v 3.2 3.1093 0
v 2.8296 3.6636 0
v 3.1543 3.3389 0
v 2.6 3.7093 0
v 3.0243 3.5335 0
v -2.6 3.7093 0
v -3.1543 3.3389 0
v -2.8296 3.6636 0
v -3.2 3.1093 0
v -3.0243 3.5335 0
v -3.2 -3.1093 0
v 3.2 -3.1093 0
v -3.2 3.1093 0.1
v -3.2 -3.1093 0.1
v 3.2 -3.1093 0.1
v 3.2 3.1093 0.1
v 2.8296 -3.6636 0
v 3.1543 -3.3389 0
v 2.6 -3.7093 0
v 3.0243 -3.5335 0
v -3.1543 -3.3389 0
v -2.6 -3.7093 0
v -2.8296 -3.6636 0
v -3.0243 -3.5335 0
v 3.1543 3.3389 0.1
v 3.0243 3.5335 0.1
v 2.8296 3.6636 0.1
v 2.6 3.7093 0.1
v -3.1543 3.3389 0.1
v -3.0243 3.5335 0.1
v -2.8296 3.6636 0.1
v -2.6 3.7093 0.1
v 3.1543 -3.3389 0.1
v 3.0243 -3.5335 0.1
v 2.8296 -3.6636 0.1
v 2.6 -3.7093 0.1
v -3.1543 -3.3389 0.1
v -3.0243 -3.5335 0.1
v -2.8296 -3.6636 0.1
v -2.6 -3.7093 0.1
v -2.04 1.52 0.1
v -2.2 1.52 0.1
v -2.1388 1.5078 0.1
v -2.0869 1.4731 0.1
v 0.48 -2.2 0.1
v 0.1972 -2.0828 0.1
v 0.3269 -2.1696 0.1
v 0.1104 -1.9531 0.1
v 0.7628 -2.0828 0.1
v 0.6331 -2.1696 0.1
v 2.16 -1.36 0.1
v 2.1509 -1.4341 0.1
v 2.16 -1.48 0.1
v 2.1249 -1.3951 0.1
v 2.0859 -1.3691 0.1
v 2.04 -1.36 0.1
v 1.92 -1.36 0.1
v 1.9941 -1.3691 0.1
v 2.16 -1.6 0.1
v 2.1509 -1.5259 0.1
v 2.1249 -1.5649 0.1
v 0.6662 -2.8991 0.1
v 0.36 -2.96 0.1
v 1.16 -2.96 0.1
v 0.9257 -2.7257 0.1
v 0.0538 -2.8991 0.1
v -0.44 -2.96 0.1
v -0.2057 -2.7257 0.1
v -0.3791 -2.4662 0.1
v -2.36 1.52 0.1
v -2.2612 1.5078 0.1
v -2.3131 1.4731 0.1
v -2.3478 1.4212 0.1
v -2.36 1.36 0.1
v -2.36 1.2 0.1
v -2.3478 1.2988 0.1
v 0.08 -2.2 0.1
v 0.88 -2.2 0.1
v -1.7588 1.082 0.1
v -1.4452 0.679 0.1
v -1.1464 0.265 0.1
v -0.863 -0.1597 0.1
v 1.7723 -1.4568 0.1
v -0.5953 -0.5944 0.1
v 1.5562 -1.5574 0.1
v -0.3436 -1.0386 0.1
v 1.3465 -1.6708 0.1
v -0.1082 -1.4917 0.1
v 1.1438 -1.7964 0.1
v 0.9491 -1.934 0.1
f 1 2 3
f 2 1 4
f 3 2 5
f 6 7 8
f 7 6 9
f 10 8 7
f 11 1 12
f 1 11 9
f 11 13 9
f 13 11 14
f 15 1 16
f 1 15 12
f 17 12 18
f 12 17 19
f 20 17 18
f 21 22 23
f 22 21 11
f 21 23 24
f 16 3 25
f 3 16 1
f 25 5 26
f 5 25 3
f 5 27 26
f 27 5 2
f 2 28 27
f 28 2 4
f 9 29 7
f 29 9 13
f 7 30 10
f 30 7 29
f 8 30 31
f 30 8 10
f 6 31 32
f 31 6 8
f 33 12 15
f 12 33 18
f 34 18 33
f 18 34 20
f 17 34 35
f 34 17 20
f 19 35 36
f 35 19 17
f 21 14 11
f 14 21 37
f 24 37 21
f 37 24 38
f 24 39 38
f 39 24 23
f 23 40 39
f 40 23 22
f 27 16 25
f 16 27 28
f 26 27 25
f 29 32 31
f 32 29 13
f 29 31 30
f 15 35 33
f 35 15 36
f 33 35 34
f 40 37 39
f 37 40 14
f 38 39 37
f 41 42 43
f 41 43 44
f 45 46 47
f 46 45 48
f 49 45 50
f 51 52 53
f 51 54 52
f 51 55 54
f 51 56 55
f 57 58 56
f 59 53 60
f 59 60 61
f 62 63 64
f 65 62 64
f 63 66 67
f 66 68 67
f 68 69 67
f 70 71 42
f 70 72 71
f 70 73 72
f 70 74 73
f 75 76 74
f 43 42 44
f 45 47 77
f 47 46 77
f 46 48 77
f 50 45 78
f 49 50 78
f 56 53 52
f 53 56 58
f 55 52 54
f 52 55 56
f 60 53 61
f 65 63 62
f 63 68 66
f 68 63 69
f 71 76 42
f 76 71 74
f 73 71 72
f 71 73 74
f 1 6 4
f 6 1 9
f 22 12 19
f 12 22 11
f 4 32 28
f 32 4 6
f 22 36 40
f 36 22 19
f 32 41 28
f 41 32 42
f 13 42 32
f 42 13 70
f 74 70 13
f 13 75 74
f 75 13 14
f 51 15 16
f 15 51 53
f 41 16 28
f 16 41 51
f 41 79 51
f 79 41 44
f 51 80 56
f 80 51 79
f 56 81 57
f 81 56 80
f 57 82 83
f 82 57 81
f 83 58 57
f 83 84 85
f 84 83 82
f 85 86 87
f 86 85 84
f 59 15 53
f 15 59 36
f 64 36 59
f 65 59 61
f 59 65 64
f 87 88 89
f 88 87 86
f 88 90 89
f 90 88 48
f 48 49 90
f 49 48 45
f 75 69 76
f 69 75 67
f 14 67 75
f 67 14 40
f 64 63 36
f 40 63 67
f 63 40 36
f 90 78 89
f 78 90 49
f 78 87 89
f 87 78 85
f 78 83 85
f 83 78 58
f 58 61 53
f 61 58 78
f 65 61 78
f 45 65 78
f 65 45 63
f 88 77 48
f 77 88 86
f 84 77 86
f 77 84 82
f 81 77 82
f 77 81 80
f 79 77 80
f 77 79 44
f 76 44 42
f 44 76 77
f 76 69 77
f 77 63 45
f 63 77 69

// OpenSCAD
// file: ../p/box3u12.scad
use <../lib.scad>
function ldraw_lib__box3u12() = [
// 0 Box with 3 Parallel Faces without Any Edges
// 0 Name: box3u12.dat
// 0 Author: J.C. Tchang [tchang]
// 0 !LDRAW_ORG Primitive UPDATE 2014-02
// 0 !LICENSE Licensed under CC BY 4.0 : see CAreadme.txt
// 
// 0 BFC CERTIFY CCW
  [0,"BFC","CERTIFY"],
  [0,"BFC","CCW"],
// 
// 0 !HISTORY 2014-12-23 [PTadmin] Official Update 2014-02
// 
// 
// 4 16 -1 1 1 1 1 1 1 1 -1 -1 1 -1
  [4,16,-1,1,1,1,1,1,1,1,-1,-1,1,-1],
// 4 16 -1 1 1 -1 0 1 1 0 1 1 1 1
  [4,16,-1,1,1,-1,0,1,1,0,1,1,1,1],
// 4 16 1 1 -1 1 0 -1 -1 0 -1 -1 1 -1
  [4,16,1,1,-1,1,0,-1,-1,0,-1,-1,1,-1],
];
module ldraw_lib__box3u12(step=0, col=false, unit=2/5, alt=false, line=0.2, solid=!$preview)
    makepoly(ldraw_lib__box3u12(), step=step, col=col, unit=unit, alt=alt, line=line, solid=solid);
ldraw_lib__box3u12(line=0.2);
// file: ../p/5-16ndis.scad
use <../lib.scad>
function ldraw_lib__5_16ndis() = [
// 0 Disc Negative 0.3125
// 0 Name: 5-16ndis.dat
// 0 Author: Max Martin Richter [MMR1988]
// 0 !LDRAW_ORG Primitive UPDATE 2013-01
// 0 !LICENSE Licensed under CC BY 4.0 : see CAreadme.txt
// 
// 0 BFC CERTIFY CCW
  [0,"BFC","CERTIFY"],
  [0,"BFC","CCW"],
// 
// 0 !HISTORY 2013-07-21 [PTadmin] Official Update 2013-01
// 
// 
// 3 16 1 0 1 0.9239 0 0.3827 1 0 0
  [3,16,1,0,1,0.9239,0,0.3827,1,0,0],
// 3 16 1 0 1 0.7071 0 0.7071 0.9239 0 0.3827
  [3,16,1,0,1,0.7071,0,0.7071,0.9239,0,0.3827],
// 3 16 1 0 1 0.3827 0 0.9239 0.7071 0 0.7071
  [3,16,1,0,1,0.3827,0,0.9239,0.7071,0,0.7071],
// 3 16 1 0 1 0 0 1 0.3827 0 0.9239
  [3,16,1,0,1,0,0,1,0.3827,0,0.9239],
// 3 16 -1 0 1 -0.3827 0 0.9239 0 0 1
  [3,16,-1,0,1,-0.3827,0,0.9239,0,0,1],
// 0 // Build by Primitive Generator 2
];
module ldraw_lib__5_16ndis(step=0, col=false, unit=2/5, alt=false, line=0.2, solid=!$preview)
    makepoly(ldraw_lib__5_16ndis(), step=step, col=col, unit=unit, alt=alt, line=line, solid=solid);
ldraw_lib__5_16ndis(line=0.2);
// file: ../p/5-16chrd.scad
use <../lib.scad>
function ldraw_lib__5_16chrd() = [
// 0 Chord 0.3125
// 0 Name: 5-16chrd.dat
// 0 Author: Niels Karsdorp [nielsk]
// 0 !LDRAW_ORG Primitive UPDATE 2010-01
// 0 !LICENSE Licensed under CC BY 4.0 : see CAreadme.txt
// 
// 0 BFC CERTIFY CCW
  [0,"BFC","CERTIFY"],
  [0,"BFC","CCW"],
// 
// 0 !HISTORY 2010-04-05 [PTadmin] Official Update 2010-01
// 
// 
// 4 16 1 0 0 0.9239 0 0.3827 0 0 1 -0.3827 0 0.9239
  [4,16,1,0,0,0.9239,0,0.3827,0,0,1,-0.3827,0,0.9239],
// 4 16 0.9239 0 0.3827 0.7071 0 0.7071 0.3827 0 0.9239 0 0 1
  [4,16,0.9239,0,0.3827,0.7071,0,0.7071,0.3827,0,0.9239,0,0,1],
// 0
// 
];
module ldraw_lib__5_16chrd(step=0, col=false, unit=2/5, alt=false, line=0.2, solid=!$preview)
    makepoly(ldraw_lib__5_16chrd(), step=step, col=col, unit=unit, alt=alt, line=line, solid=solid);
ldraw_lib__5_16chrd(line=0.2);
// file: ../p/3-16ndis.scad
use <../lib.scad>
function ldraw_lib__3_16ndis() = [
// 0 Disc Negative 0.1875
// 0 Name: 3-16ndis.dat
// 0 Author: Magnus Forsberg [MagFors]
// 0 !LDRAW_ORG Primitive UPDATE 2024-01
// 0 !LICENSE Licensed under CC BY 4.0 : see CAreadme.txt
// 
// 0 BFC CERTIFY CCW
  [0,"BFC","CERTIFY"],
  [0,"BFC","CCW"],
// 
// 0 !HISTORY 2009-05-02 [PTadmin] Official Update 2009-01
// 0 !HISTORY 2024-01-03 [MagFors] Complete regeneration, original by guyvivan
// 0 !HISTORY 2024-01-29 [OrionP] Official Update 2024-01
// 
// 3 16 1 0 1 0.9239 0 0.3827 1 0 0
  [3,16,1,0,1,0.9239,0,0.3827,1,0,0],
// 3 16 1 0 1 0.7071 0 0.7071 0.9239 0 0.3827
  [3,16,1,0,1,0.7071,0,0.7071,0.9239,0,0.3827],
// 3 16 1 0 1 0.3827 0 0.9239 0.7071 0 0.7071
  [3,16,1,0,1,0.3827,0,0.9239,0.7071,0,0.7071],
// 0 // Build by LDPartEditor (PrimGen 2.X)
];
module ldraw_lib__3_16ndis(step=0, col=false, unit=2/5, alt=false, line=0.2, solid=!$preview)
    makepoly(ldraw_lib__3_16ndis(), step=step, col=col, unit=unit, alt=alt, line=line, solid=solid);
ldraw_lib__3_16ndis(line=0.2);
// file: ../p/3-16chrd.scad
use <../lib.scad>
function ldraw_lib__3_16chrd() = [
// 0 Chord 0.1875
// 0 Name: 3-16chrd.dat
// 0 Author: Niels Karsdorp [nielsk]
// 0 !LDRAW_ORG Primitive UPDATE 2009-01
// 0 !LICENSE Licensed under CC BY 4.0 : see CAreadme.txt
// 
// 0 BFC CERTIFY CCW
  [0,"BFC","CERTIFY"],
  [0,"BFC","CCW"],
// 
// 0 !HISTORY 2009-05-02 [PTadmin] Official Update 2009-01
// 
// 
// 4 16 1 0 0 0.9239 0 0.3827 0.7071 0 0.7071 0.3827 0 0.9239
  [4,16,1,0,0,0.9239,0,0.3827,0.7071,0,0.7071,0.3827,0,0.9239],
// 0
// 
];
module ldraw_lib__3_16chrd(step=0, col=false, unit=2/5, alt=false, line=0.2, solid=!$preview)
    makepoly(ldraw_lib__3_16chrd(), step=step, col=col, unit=unit, alt=alt, line=line, solid=solid);
ldraw_lib__3_16chrd(line=0.2);
// file: ../p/1-8ndis.scad
use <../lib.scad>
function ldraw_lib__1_8ndis() = [
// 0 Disc Negative 0.125
// 0 Name: 1-8ndis.dat
// 0 Author: James Jessiman
// 0 !LDRAW_ORG Primitive UPDATE 2012-01
// 0 !LICENSE Licensed under CC BY 4.0 : see CAreadme.txt
// 
// 0 BFC CERTIFY CCW
  [0,"BFC","CERTIFY"],
  [0,"BFC","CCW"],
// 
// 0 !HISTORY 2002-03-23 [sbliss] Added BFC statement
// 0 !HISTORY 2002-04-25 [PTadmin] Official Update 2002-02
// 0 !HISTORY 2007-06-22 [PTadmin] Header formatted for Contributor Agreement
// 0 !HISTORY 2008-07-01 [PTadmin] Official Update 2008-01
// 0 !HISTORY 2012-02-16 [Philo] Changed to CCW
// 0 !HISTORY 2012-03-30 [PTadmin] Official Update 2012-01
// 
// 
// 3 16 0.9239 0 0.3827 1 0 0 1 0 1
  [3,16,0.9239,0,0.3827,1,0,0,1,0,1],
// 3 16 0.7071 0 0.7071 0.9239 0 0.3827 1 0 1
  [3,16,0.7071,0,0.7071,0.9239,0,0.3827,1,0,1],
];
module ldraw_lib__1_8ndis(step=0, col=false, unit=2/5, alt=false, line=0.2, solid=!$preview)
    makepoly(ldraw_lib__1_8ndis(), step=step, col=col, unit=unit, alt=alt, line=line, solid=solid);
ldraw_lib__1_8ndis(line=0.2);
// file: ../p/1-8chrd.scad
use <../lib.scad>
function ldraw_lib__1_8chrd() = [
// 0 Chord 0.125
// 0 Name: 1-8chrd.dat
// 0 Author: Orion Pobursky [OrionP]
// 0 !LDRAW_ORG Primitive UPDATE 2023-05
// 0 !LICENSE Licensed under CC BY 4.0 : see CAreadme.txt
// 
// 0 BFC CERTIFY CCW
  [0,"BFC","CERTIFY"],
  [0,"BFC","CCW"],
// 
// 0 !HISTORY 2004-04-22 [PTadmin] Official Update 2004-02
// 0 !HISTORY 2007-06-22 [PTadmin] Header formatted for Contributor Agreement
// 0 !HISTORY 2008-07-01 [PTadmin] Official Update 2008-01
// 0 !HISTORY 2023-10-27 [OrionP] Rebuilt with PrimGen2, original author westrate
// 0 !HISTORY 2023-10-31 [OrionP] Official Update 2023-05
// 
// 3 16 1 0 0 0.9239 0 0.3827 0.7071 0 0.7071
  [3,16,1,0,0,0.9239,0,0.3827,0.7071,0,0.7071],
];
module ldraw_lib__1_8chrd(step=0, col=false, unit=2/5, alt=false, line=0.2, solid=!$preview)
    makepoly(ldraw_lib__1_8chrd(), step=step, col=col, unit=unit, alt=alt, line=line, solid=solid);
ldraw_lib__1_8chrd(line=0.2);
// file: ../p/1-4cyli.scad
use <../lib.scad>
function ldraw_lib__1_4cyli() = [
// 0 Cylinder 0.25
// 0 Name: 1-4cyli.dat
// 0 Author: James Jessiman
// 0 !LDRAW_ORG Primitive UPDATE 2012-01
// 0 !LICENSE Licensed under CC BY 4.0 : see CAreadme.txt
// 
// 0 BFC CERTIFY CCW
  [0,"BFC","CERTIFY"],
  [0,"BFC","CCW"],
// 
// 0 !HISTORY 2002-03-23 [sbliss] Added BFC statement.
// 0 !HISTORY 2002-04-25 [PTadmin] Official Update 2002-02
// 0 !HISTORY 2007-06-22 [PTadmin] Header formatted for Contributor Agreement
// 0 !HISTORY 2008-07-01 [PTadmin] Official Update 2008-01
// 0 !HISTORY 2012-02-16 [Philo] Changed to CCW
// 0 !HISTORY 2012-03-30 [PTadmin] Official Update 2012-01
// 
// 
// 4 16 1 1 0 0.9239 1 0.3827 0.9239 0 0.3827 1 0 0
  [4,16,1,1,0,0.9239,1,0.3827,0.9239,0,0.3827,1,0,0],
// 5 24 1 0 0 1 1 0 0.9239 0 0.3827 1 0 -1
  [5,24,1,0,0,1,1,0,0.9239,0,0.3827,1,0,-1],
// 4 16 0.9239 1 0.3827 0.7071 1 0.7071 0.7071 0 0.7071 0.9239 0 0.3827
  [4,16,0.9239,1,0.3827,0.7071,1,0.7071,0.7071,0,0.7071,0.9239,0,0.3827],
// 5 24 0.9239 0 0.3827 0.9239 1 0.3827 0.7071 0 0.7071 1 0 0
  [5,24,0.9239,0,0.3827,0.9239,1,0.3827,0.7071,0,0.7071,1,0,0],
// 4 16 0.7071 1 0.7071 0.3827 1 0.9239 0.3827 0 0.9239 0.7071 0 0.7071
  [4,16,0.7071,1,0.7071,0.3827,1,0.9239,0.3827,0,0.9239,0.7071,0,0.7071],
// 5 24 0.7071 0 0.7071 0.7071 1 0.7071 0.3827 0 0.9239 0.9239 0 0.3827
  [5,24,0.7071,0,0.7071,0.7071,1,0.7071,0.3827,0,0.9239,0.9239,0,0.3827],
// 4 16 0.3827 1 0.9239 0 1 1 0 0 1 0.3827 0 0.9239
  [4,16,0.3827,1,0.9239,0,1,1,0,0,1,0.3827,0,0.9239],
// 5 24 0.3827 0 0.9239 0.3827 1 0.9239 0 0 1 0.7071 0 0.7071
  [5,24,0.3827,0,0.9239,0.3827,1,0.9239,0,0,1,0.7071,0,0.7071],
// 5 24 0 0 1 0 1 1 0.3827 0 0.9239 -1 0 1
  [5,24,0,0,1,0,1,1,0.3827,0,0.9239,-1,0,1],
];
module ldraw_lib__1_4cyli(step=0, col=false, unit=2/5, alt=false, line=0.2, solid=!$preview)
    makepoly(ldraw_lib__1_4cyli(), step=step, col=col, unit=unit, alt=alt, line=line, solid=solid);
ldraw_lib__1_4cyli(line=0.2);
// file: ../p/1-4chrd.scad
use <../lib.scad>
function ldraw_lib__1_4chrd() = [
// 0 Chord 0.25
// 0 Name: 1-4chrd.dat
// 0 Author: Max Martin Richter [MMR1988]
// 0 !LDRAW_ORG Primitive UPDATE 2023-05
// 0 !LICENSE Licensed under CC BY 4.0 : see CAreadme.txt
// 
// 0 BFC CERTIFY CCW
  [0,"BFC","CERTIFY"],
  [0,"BFC","CCW"],
// 
// 0 !HISTORY 2004-04-22 [PTadmin] Official Update 2004-02
// 0 !HISTORY 2007-10-09 [PTadmin] Header formatted for Contributor Agreement
// 0 !HISTORY 2008-07-01 [PTadmin] Official Update 2008-01
// 0 !HISTORY 2012-08-02 [MMR1988] Re-creation with PrimGen2 and Rectifier
// 0 !HISTORY 2012-08-09 [PTadmin] Official Update 2012-02
// 0 !HISTORY 2023-10-27 [OrionP] Change author to MMR1988 from hafhead
// 0 !HISTORY 2023-10-31 [OrionP] Official Update 2023-05
// 
// 4 16 0.9239 0 0.3827 0.3827 0 0.9239 0 0 1 1 0 0
  [4,16,0.9239,0,0.3827,0.3827,0,0.9239,0,0,1,1,0,0],
// 3 16 0.7071 0 0.7071 0.3827 0 0.9239 0.9239 0 0.3827
  [3,16,0.7071,0,0.7071,0.3827,0,0.9239,0.9239,0,0.3827],
];
module ldraw_lib__1_4chrd(step=0, col=false, unit=2/5, alt=false, line=0.2, solid=!$preview)
    makepoly(ldraw_lib__1_4chrd(), step=step, col=col, unit=unit, alt=alt, line=line, solid=solid);
ldraw_lib__1_4chrd(line=0.2);
// main file
use <../lib.scad>
use <6177741w.scad>
function ldraw_lib__6177741x() = [
// 0 Sticker  0.9 x  0.8 with White Arc on Transparent Background Left
// 0 Name: 6177741x.dat
// 0 Author: Massimo Maso [Sirio]
// 0 !LDRAW_ORG Part UPDATE 2025-05
// 0 !LICENSE Licensed under CC BY 4.0 : see CAreadme.txt
// 
// 0 BFC CERTIFY CCW
  [0,"BFC","CERTIFY"],
  [0,"BFC","CCW"],
// 
// 0 !KEYWORDS AMG, GT3, Mercedes, Set 75877, Speed Champions
// 
// 0 !HISTORY 2025-05-28 [OrionP] Official Update 2025-05
// 
// 
// 1 16 0 0 0 -1 0 0 0 1 0 0 0 1 6177741w.dat
  [1,16,0,0,0,-1,0,0,0,1,0,0,0,1, ldraw_lib__6177741w()],
];
module ldraw_lib__6177741x(step=0, col=false, unit=2/5, alt=false, line=0.2, solid=!$preview)
    makepoly(ldraw_lib__6177741x(), step=step, col=col, unit=unit, alt=alt, line=line, solid=solid);
ldraw_lib__6177741x(line=0.2);
